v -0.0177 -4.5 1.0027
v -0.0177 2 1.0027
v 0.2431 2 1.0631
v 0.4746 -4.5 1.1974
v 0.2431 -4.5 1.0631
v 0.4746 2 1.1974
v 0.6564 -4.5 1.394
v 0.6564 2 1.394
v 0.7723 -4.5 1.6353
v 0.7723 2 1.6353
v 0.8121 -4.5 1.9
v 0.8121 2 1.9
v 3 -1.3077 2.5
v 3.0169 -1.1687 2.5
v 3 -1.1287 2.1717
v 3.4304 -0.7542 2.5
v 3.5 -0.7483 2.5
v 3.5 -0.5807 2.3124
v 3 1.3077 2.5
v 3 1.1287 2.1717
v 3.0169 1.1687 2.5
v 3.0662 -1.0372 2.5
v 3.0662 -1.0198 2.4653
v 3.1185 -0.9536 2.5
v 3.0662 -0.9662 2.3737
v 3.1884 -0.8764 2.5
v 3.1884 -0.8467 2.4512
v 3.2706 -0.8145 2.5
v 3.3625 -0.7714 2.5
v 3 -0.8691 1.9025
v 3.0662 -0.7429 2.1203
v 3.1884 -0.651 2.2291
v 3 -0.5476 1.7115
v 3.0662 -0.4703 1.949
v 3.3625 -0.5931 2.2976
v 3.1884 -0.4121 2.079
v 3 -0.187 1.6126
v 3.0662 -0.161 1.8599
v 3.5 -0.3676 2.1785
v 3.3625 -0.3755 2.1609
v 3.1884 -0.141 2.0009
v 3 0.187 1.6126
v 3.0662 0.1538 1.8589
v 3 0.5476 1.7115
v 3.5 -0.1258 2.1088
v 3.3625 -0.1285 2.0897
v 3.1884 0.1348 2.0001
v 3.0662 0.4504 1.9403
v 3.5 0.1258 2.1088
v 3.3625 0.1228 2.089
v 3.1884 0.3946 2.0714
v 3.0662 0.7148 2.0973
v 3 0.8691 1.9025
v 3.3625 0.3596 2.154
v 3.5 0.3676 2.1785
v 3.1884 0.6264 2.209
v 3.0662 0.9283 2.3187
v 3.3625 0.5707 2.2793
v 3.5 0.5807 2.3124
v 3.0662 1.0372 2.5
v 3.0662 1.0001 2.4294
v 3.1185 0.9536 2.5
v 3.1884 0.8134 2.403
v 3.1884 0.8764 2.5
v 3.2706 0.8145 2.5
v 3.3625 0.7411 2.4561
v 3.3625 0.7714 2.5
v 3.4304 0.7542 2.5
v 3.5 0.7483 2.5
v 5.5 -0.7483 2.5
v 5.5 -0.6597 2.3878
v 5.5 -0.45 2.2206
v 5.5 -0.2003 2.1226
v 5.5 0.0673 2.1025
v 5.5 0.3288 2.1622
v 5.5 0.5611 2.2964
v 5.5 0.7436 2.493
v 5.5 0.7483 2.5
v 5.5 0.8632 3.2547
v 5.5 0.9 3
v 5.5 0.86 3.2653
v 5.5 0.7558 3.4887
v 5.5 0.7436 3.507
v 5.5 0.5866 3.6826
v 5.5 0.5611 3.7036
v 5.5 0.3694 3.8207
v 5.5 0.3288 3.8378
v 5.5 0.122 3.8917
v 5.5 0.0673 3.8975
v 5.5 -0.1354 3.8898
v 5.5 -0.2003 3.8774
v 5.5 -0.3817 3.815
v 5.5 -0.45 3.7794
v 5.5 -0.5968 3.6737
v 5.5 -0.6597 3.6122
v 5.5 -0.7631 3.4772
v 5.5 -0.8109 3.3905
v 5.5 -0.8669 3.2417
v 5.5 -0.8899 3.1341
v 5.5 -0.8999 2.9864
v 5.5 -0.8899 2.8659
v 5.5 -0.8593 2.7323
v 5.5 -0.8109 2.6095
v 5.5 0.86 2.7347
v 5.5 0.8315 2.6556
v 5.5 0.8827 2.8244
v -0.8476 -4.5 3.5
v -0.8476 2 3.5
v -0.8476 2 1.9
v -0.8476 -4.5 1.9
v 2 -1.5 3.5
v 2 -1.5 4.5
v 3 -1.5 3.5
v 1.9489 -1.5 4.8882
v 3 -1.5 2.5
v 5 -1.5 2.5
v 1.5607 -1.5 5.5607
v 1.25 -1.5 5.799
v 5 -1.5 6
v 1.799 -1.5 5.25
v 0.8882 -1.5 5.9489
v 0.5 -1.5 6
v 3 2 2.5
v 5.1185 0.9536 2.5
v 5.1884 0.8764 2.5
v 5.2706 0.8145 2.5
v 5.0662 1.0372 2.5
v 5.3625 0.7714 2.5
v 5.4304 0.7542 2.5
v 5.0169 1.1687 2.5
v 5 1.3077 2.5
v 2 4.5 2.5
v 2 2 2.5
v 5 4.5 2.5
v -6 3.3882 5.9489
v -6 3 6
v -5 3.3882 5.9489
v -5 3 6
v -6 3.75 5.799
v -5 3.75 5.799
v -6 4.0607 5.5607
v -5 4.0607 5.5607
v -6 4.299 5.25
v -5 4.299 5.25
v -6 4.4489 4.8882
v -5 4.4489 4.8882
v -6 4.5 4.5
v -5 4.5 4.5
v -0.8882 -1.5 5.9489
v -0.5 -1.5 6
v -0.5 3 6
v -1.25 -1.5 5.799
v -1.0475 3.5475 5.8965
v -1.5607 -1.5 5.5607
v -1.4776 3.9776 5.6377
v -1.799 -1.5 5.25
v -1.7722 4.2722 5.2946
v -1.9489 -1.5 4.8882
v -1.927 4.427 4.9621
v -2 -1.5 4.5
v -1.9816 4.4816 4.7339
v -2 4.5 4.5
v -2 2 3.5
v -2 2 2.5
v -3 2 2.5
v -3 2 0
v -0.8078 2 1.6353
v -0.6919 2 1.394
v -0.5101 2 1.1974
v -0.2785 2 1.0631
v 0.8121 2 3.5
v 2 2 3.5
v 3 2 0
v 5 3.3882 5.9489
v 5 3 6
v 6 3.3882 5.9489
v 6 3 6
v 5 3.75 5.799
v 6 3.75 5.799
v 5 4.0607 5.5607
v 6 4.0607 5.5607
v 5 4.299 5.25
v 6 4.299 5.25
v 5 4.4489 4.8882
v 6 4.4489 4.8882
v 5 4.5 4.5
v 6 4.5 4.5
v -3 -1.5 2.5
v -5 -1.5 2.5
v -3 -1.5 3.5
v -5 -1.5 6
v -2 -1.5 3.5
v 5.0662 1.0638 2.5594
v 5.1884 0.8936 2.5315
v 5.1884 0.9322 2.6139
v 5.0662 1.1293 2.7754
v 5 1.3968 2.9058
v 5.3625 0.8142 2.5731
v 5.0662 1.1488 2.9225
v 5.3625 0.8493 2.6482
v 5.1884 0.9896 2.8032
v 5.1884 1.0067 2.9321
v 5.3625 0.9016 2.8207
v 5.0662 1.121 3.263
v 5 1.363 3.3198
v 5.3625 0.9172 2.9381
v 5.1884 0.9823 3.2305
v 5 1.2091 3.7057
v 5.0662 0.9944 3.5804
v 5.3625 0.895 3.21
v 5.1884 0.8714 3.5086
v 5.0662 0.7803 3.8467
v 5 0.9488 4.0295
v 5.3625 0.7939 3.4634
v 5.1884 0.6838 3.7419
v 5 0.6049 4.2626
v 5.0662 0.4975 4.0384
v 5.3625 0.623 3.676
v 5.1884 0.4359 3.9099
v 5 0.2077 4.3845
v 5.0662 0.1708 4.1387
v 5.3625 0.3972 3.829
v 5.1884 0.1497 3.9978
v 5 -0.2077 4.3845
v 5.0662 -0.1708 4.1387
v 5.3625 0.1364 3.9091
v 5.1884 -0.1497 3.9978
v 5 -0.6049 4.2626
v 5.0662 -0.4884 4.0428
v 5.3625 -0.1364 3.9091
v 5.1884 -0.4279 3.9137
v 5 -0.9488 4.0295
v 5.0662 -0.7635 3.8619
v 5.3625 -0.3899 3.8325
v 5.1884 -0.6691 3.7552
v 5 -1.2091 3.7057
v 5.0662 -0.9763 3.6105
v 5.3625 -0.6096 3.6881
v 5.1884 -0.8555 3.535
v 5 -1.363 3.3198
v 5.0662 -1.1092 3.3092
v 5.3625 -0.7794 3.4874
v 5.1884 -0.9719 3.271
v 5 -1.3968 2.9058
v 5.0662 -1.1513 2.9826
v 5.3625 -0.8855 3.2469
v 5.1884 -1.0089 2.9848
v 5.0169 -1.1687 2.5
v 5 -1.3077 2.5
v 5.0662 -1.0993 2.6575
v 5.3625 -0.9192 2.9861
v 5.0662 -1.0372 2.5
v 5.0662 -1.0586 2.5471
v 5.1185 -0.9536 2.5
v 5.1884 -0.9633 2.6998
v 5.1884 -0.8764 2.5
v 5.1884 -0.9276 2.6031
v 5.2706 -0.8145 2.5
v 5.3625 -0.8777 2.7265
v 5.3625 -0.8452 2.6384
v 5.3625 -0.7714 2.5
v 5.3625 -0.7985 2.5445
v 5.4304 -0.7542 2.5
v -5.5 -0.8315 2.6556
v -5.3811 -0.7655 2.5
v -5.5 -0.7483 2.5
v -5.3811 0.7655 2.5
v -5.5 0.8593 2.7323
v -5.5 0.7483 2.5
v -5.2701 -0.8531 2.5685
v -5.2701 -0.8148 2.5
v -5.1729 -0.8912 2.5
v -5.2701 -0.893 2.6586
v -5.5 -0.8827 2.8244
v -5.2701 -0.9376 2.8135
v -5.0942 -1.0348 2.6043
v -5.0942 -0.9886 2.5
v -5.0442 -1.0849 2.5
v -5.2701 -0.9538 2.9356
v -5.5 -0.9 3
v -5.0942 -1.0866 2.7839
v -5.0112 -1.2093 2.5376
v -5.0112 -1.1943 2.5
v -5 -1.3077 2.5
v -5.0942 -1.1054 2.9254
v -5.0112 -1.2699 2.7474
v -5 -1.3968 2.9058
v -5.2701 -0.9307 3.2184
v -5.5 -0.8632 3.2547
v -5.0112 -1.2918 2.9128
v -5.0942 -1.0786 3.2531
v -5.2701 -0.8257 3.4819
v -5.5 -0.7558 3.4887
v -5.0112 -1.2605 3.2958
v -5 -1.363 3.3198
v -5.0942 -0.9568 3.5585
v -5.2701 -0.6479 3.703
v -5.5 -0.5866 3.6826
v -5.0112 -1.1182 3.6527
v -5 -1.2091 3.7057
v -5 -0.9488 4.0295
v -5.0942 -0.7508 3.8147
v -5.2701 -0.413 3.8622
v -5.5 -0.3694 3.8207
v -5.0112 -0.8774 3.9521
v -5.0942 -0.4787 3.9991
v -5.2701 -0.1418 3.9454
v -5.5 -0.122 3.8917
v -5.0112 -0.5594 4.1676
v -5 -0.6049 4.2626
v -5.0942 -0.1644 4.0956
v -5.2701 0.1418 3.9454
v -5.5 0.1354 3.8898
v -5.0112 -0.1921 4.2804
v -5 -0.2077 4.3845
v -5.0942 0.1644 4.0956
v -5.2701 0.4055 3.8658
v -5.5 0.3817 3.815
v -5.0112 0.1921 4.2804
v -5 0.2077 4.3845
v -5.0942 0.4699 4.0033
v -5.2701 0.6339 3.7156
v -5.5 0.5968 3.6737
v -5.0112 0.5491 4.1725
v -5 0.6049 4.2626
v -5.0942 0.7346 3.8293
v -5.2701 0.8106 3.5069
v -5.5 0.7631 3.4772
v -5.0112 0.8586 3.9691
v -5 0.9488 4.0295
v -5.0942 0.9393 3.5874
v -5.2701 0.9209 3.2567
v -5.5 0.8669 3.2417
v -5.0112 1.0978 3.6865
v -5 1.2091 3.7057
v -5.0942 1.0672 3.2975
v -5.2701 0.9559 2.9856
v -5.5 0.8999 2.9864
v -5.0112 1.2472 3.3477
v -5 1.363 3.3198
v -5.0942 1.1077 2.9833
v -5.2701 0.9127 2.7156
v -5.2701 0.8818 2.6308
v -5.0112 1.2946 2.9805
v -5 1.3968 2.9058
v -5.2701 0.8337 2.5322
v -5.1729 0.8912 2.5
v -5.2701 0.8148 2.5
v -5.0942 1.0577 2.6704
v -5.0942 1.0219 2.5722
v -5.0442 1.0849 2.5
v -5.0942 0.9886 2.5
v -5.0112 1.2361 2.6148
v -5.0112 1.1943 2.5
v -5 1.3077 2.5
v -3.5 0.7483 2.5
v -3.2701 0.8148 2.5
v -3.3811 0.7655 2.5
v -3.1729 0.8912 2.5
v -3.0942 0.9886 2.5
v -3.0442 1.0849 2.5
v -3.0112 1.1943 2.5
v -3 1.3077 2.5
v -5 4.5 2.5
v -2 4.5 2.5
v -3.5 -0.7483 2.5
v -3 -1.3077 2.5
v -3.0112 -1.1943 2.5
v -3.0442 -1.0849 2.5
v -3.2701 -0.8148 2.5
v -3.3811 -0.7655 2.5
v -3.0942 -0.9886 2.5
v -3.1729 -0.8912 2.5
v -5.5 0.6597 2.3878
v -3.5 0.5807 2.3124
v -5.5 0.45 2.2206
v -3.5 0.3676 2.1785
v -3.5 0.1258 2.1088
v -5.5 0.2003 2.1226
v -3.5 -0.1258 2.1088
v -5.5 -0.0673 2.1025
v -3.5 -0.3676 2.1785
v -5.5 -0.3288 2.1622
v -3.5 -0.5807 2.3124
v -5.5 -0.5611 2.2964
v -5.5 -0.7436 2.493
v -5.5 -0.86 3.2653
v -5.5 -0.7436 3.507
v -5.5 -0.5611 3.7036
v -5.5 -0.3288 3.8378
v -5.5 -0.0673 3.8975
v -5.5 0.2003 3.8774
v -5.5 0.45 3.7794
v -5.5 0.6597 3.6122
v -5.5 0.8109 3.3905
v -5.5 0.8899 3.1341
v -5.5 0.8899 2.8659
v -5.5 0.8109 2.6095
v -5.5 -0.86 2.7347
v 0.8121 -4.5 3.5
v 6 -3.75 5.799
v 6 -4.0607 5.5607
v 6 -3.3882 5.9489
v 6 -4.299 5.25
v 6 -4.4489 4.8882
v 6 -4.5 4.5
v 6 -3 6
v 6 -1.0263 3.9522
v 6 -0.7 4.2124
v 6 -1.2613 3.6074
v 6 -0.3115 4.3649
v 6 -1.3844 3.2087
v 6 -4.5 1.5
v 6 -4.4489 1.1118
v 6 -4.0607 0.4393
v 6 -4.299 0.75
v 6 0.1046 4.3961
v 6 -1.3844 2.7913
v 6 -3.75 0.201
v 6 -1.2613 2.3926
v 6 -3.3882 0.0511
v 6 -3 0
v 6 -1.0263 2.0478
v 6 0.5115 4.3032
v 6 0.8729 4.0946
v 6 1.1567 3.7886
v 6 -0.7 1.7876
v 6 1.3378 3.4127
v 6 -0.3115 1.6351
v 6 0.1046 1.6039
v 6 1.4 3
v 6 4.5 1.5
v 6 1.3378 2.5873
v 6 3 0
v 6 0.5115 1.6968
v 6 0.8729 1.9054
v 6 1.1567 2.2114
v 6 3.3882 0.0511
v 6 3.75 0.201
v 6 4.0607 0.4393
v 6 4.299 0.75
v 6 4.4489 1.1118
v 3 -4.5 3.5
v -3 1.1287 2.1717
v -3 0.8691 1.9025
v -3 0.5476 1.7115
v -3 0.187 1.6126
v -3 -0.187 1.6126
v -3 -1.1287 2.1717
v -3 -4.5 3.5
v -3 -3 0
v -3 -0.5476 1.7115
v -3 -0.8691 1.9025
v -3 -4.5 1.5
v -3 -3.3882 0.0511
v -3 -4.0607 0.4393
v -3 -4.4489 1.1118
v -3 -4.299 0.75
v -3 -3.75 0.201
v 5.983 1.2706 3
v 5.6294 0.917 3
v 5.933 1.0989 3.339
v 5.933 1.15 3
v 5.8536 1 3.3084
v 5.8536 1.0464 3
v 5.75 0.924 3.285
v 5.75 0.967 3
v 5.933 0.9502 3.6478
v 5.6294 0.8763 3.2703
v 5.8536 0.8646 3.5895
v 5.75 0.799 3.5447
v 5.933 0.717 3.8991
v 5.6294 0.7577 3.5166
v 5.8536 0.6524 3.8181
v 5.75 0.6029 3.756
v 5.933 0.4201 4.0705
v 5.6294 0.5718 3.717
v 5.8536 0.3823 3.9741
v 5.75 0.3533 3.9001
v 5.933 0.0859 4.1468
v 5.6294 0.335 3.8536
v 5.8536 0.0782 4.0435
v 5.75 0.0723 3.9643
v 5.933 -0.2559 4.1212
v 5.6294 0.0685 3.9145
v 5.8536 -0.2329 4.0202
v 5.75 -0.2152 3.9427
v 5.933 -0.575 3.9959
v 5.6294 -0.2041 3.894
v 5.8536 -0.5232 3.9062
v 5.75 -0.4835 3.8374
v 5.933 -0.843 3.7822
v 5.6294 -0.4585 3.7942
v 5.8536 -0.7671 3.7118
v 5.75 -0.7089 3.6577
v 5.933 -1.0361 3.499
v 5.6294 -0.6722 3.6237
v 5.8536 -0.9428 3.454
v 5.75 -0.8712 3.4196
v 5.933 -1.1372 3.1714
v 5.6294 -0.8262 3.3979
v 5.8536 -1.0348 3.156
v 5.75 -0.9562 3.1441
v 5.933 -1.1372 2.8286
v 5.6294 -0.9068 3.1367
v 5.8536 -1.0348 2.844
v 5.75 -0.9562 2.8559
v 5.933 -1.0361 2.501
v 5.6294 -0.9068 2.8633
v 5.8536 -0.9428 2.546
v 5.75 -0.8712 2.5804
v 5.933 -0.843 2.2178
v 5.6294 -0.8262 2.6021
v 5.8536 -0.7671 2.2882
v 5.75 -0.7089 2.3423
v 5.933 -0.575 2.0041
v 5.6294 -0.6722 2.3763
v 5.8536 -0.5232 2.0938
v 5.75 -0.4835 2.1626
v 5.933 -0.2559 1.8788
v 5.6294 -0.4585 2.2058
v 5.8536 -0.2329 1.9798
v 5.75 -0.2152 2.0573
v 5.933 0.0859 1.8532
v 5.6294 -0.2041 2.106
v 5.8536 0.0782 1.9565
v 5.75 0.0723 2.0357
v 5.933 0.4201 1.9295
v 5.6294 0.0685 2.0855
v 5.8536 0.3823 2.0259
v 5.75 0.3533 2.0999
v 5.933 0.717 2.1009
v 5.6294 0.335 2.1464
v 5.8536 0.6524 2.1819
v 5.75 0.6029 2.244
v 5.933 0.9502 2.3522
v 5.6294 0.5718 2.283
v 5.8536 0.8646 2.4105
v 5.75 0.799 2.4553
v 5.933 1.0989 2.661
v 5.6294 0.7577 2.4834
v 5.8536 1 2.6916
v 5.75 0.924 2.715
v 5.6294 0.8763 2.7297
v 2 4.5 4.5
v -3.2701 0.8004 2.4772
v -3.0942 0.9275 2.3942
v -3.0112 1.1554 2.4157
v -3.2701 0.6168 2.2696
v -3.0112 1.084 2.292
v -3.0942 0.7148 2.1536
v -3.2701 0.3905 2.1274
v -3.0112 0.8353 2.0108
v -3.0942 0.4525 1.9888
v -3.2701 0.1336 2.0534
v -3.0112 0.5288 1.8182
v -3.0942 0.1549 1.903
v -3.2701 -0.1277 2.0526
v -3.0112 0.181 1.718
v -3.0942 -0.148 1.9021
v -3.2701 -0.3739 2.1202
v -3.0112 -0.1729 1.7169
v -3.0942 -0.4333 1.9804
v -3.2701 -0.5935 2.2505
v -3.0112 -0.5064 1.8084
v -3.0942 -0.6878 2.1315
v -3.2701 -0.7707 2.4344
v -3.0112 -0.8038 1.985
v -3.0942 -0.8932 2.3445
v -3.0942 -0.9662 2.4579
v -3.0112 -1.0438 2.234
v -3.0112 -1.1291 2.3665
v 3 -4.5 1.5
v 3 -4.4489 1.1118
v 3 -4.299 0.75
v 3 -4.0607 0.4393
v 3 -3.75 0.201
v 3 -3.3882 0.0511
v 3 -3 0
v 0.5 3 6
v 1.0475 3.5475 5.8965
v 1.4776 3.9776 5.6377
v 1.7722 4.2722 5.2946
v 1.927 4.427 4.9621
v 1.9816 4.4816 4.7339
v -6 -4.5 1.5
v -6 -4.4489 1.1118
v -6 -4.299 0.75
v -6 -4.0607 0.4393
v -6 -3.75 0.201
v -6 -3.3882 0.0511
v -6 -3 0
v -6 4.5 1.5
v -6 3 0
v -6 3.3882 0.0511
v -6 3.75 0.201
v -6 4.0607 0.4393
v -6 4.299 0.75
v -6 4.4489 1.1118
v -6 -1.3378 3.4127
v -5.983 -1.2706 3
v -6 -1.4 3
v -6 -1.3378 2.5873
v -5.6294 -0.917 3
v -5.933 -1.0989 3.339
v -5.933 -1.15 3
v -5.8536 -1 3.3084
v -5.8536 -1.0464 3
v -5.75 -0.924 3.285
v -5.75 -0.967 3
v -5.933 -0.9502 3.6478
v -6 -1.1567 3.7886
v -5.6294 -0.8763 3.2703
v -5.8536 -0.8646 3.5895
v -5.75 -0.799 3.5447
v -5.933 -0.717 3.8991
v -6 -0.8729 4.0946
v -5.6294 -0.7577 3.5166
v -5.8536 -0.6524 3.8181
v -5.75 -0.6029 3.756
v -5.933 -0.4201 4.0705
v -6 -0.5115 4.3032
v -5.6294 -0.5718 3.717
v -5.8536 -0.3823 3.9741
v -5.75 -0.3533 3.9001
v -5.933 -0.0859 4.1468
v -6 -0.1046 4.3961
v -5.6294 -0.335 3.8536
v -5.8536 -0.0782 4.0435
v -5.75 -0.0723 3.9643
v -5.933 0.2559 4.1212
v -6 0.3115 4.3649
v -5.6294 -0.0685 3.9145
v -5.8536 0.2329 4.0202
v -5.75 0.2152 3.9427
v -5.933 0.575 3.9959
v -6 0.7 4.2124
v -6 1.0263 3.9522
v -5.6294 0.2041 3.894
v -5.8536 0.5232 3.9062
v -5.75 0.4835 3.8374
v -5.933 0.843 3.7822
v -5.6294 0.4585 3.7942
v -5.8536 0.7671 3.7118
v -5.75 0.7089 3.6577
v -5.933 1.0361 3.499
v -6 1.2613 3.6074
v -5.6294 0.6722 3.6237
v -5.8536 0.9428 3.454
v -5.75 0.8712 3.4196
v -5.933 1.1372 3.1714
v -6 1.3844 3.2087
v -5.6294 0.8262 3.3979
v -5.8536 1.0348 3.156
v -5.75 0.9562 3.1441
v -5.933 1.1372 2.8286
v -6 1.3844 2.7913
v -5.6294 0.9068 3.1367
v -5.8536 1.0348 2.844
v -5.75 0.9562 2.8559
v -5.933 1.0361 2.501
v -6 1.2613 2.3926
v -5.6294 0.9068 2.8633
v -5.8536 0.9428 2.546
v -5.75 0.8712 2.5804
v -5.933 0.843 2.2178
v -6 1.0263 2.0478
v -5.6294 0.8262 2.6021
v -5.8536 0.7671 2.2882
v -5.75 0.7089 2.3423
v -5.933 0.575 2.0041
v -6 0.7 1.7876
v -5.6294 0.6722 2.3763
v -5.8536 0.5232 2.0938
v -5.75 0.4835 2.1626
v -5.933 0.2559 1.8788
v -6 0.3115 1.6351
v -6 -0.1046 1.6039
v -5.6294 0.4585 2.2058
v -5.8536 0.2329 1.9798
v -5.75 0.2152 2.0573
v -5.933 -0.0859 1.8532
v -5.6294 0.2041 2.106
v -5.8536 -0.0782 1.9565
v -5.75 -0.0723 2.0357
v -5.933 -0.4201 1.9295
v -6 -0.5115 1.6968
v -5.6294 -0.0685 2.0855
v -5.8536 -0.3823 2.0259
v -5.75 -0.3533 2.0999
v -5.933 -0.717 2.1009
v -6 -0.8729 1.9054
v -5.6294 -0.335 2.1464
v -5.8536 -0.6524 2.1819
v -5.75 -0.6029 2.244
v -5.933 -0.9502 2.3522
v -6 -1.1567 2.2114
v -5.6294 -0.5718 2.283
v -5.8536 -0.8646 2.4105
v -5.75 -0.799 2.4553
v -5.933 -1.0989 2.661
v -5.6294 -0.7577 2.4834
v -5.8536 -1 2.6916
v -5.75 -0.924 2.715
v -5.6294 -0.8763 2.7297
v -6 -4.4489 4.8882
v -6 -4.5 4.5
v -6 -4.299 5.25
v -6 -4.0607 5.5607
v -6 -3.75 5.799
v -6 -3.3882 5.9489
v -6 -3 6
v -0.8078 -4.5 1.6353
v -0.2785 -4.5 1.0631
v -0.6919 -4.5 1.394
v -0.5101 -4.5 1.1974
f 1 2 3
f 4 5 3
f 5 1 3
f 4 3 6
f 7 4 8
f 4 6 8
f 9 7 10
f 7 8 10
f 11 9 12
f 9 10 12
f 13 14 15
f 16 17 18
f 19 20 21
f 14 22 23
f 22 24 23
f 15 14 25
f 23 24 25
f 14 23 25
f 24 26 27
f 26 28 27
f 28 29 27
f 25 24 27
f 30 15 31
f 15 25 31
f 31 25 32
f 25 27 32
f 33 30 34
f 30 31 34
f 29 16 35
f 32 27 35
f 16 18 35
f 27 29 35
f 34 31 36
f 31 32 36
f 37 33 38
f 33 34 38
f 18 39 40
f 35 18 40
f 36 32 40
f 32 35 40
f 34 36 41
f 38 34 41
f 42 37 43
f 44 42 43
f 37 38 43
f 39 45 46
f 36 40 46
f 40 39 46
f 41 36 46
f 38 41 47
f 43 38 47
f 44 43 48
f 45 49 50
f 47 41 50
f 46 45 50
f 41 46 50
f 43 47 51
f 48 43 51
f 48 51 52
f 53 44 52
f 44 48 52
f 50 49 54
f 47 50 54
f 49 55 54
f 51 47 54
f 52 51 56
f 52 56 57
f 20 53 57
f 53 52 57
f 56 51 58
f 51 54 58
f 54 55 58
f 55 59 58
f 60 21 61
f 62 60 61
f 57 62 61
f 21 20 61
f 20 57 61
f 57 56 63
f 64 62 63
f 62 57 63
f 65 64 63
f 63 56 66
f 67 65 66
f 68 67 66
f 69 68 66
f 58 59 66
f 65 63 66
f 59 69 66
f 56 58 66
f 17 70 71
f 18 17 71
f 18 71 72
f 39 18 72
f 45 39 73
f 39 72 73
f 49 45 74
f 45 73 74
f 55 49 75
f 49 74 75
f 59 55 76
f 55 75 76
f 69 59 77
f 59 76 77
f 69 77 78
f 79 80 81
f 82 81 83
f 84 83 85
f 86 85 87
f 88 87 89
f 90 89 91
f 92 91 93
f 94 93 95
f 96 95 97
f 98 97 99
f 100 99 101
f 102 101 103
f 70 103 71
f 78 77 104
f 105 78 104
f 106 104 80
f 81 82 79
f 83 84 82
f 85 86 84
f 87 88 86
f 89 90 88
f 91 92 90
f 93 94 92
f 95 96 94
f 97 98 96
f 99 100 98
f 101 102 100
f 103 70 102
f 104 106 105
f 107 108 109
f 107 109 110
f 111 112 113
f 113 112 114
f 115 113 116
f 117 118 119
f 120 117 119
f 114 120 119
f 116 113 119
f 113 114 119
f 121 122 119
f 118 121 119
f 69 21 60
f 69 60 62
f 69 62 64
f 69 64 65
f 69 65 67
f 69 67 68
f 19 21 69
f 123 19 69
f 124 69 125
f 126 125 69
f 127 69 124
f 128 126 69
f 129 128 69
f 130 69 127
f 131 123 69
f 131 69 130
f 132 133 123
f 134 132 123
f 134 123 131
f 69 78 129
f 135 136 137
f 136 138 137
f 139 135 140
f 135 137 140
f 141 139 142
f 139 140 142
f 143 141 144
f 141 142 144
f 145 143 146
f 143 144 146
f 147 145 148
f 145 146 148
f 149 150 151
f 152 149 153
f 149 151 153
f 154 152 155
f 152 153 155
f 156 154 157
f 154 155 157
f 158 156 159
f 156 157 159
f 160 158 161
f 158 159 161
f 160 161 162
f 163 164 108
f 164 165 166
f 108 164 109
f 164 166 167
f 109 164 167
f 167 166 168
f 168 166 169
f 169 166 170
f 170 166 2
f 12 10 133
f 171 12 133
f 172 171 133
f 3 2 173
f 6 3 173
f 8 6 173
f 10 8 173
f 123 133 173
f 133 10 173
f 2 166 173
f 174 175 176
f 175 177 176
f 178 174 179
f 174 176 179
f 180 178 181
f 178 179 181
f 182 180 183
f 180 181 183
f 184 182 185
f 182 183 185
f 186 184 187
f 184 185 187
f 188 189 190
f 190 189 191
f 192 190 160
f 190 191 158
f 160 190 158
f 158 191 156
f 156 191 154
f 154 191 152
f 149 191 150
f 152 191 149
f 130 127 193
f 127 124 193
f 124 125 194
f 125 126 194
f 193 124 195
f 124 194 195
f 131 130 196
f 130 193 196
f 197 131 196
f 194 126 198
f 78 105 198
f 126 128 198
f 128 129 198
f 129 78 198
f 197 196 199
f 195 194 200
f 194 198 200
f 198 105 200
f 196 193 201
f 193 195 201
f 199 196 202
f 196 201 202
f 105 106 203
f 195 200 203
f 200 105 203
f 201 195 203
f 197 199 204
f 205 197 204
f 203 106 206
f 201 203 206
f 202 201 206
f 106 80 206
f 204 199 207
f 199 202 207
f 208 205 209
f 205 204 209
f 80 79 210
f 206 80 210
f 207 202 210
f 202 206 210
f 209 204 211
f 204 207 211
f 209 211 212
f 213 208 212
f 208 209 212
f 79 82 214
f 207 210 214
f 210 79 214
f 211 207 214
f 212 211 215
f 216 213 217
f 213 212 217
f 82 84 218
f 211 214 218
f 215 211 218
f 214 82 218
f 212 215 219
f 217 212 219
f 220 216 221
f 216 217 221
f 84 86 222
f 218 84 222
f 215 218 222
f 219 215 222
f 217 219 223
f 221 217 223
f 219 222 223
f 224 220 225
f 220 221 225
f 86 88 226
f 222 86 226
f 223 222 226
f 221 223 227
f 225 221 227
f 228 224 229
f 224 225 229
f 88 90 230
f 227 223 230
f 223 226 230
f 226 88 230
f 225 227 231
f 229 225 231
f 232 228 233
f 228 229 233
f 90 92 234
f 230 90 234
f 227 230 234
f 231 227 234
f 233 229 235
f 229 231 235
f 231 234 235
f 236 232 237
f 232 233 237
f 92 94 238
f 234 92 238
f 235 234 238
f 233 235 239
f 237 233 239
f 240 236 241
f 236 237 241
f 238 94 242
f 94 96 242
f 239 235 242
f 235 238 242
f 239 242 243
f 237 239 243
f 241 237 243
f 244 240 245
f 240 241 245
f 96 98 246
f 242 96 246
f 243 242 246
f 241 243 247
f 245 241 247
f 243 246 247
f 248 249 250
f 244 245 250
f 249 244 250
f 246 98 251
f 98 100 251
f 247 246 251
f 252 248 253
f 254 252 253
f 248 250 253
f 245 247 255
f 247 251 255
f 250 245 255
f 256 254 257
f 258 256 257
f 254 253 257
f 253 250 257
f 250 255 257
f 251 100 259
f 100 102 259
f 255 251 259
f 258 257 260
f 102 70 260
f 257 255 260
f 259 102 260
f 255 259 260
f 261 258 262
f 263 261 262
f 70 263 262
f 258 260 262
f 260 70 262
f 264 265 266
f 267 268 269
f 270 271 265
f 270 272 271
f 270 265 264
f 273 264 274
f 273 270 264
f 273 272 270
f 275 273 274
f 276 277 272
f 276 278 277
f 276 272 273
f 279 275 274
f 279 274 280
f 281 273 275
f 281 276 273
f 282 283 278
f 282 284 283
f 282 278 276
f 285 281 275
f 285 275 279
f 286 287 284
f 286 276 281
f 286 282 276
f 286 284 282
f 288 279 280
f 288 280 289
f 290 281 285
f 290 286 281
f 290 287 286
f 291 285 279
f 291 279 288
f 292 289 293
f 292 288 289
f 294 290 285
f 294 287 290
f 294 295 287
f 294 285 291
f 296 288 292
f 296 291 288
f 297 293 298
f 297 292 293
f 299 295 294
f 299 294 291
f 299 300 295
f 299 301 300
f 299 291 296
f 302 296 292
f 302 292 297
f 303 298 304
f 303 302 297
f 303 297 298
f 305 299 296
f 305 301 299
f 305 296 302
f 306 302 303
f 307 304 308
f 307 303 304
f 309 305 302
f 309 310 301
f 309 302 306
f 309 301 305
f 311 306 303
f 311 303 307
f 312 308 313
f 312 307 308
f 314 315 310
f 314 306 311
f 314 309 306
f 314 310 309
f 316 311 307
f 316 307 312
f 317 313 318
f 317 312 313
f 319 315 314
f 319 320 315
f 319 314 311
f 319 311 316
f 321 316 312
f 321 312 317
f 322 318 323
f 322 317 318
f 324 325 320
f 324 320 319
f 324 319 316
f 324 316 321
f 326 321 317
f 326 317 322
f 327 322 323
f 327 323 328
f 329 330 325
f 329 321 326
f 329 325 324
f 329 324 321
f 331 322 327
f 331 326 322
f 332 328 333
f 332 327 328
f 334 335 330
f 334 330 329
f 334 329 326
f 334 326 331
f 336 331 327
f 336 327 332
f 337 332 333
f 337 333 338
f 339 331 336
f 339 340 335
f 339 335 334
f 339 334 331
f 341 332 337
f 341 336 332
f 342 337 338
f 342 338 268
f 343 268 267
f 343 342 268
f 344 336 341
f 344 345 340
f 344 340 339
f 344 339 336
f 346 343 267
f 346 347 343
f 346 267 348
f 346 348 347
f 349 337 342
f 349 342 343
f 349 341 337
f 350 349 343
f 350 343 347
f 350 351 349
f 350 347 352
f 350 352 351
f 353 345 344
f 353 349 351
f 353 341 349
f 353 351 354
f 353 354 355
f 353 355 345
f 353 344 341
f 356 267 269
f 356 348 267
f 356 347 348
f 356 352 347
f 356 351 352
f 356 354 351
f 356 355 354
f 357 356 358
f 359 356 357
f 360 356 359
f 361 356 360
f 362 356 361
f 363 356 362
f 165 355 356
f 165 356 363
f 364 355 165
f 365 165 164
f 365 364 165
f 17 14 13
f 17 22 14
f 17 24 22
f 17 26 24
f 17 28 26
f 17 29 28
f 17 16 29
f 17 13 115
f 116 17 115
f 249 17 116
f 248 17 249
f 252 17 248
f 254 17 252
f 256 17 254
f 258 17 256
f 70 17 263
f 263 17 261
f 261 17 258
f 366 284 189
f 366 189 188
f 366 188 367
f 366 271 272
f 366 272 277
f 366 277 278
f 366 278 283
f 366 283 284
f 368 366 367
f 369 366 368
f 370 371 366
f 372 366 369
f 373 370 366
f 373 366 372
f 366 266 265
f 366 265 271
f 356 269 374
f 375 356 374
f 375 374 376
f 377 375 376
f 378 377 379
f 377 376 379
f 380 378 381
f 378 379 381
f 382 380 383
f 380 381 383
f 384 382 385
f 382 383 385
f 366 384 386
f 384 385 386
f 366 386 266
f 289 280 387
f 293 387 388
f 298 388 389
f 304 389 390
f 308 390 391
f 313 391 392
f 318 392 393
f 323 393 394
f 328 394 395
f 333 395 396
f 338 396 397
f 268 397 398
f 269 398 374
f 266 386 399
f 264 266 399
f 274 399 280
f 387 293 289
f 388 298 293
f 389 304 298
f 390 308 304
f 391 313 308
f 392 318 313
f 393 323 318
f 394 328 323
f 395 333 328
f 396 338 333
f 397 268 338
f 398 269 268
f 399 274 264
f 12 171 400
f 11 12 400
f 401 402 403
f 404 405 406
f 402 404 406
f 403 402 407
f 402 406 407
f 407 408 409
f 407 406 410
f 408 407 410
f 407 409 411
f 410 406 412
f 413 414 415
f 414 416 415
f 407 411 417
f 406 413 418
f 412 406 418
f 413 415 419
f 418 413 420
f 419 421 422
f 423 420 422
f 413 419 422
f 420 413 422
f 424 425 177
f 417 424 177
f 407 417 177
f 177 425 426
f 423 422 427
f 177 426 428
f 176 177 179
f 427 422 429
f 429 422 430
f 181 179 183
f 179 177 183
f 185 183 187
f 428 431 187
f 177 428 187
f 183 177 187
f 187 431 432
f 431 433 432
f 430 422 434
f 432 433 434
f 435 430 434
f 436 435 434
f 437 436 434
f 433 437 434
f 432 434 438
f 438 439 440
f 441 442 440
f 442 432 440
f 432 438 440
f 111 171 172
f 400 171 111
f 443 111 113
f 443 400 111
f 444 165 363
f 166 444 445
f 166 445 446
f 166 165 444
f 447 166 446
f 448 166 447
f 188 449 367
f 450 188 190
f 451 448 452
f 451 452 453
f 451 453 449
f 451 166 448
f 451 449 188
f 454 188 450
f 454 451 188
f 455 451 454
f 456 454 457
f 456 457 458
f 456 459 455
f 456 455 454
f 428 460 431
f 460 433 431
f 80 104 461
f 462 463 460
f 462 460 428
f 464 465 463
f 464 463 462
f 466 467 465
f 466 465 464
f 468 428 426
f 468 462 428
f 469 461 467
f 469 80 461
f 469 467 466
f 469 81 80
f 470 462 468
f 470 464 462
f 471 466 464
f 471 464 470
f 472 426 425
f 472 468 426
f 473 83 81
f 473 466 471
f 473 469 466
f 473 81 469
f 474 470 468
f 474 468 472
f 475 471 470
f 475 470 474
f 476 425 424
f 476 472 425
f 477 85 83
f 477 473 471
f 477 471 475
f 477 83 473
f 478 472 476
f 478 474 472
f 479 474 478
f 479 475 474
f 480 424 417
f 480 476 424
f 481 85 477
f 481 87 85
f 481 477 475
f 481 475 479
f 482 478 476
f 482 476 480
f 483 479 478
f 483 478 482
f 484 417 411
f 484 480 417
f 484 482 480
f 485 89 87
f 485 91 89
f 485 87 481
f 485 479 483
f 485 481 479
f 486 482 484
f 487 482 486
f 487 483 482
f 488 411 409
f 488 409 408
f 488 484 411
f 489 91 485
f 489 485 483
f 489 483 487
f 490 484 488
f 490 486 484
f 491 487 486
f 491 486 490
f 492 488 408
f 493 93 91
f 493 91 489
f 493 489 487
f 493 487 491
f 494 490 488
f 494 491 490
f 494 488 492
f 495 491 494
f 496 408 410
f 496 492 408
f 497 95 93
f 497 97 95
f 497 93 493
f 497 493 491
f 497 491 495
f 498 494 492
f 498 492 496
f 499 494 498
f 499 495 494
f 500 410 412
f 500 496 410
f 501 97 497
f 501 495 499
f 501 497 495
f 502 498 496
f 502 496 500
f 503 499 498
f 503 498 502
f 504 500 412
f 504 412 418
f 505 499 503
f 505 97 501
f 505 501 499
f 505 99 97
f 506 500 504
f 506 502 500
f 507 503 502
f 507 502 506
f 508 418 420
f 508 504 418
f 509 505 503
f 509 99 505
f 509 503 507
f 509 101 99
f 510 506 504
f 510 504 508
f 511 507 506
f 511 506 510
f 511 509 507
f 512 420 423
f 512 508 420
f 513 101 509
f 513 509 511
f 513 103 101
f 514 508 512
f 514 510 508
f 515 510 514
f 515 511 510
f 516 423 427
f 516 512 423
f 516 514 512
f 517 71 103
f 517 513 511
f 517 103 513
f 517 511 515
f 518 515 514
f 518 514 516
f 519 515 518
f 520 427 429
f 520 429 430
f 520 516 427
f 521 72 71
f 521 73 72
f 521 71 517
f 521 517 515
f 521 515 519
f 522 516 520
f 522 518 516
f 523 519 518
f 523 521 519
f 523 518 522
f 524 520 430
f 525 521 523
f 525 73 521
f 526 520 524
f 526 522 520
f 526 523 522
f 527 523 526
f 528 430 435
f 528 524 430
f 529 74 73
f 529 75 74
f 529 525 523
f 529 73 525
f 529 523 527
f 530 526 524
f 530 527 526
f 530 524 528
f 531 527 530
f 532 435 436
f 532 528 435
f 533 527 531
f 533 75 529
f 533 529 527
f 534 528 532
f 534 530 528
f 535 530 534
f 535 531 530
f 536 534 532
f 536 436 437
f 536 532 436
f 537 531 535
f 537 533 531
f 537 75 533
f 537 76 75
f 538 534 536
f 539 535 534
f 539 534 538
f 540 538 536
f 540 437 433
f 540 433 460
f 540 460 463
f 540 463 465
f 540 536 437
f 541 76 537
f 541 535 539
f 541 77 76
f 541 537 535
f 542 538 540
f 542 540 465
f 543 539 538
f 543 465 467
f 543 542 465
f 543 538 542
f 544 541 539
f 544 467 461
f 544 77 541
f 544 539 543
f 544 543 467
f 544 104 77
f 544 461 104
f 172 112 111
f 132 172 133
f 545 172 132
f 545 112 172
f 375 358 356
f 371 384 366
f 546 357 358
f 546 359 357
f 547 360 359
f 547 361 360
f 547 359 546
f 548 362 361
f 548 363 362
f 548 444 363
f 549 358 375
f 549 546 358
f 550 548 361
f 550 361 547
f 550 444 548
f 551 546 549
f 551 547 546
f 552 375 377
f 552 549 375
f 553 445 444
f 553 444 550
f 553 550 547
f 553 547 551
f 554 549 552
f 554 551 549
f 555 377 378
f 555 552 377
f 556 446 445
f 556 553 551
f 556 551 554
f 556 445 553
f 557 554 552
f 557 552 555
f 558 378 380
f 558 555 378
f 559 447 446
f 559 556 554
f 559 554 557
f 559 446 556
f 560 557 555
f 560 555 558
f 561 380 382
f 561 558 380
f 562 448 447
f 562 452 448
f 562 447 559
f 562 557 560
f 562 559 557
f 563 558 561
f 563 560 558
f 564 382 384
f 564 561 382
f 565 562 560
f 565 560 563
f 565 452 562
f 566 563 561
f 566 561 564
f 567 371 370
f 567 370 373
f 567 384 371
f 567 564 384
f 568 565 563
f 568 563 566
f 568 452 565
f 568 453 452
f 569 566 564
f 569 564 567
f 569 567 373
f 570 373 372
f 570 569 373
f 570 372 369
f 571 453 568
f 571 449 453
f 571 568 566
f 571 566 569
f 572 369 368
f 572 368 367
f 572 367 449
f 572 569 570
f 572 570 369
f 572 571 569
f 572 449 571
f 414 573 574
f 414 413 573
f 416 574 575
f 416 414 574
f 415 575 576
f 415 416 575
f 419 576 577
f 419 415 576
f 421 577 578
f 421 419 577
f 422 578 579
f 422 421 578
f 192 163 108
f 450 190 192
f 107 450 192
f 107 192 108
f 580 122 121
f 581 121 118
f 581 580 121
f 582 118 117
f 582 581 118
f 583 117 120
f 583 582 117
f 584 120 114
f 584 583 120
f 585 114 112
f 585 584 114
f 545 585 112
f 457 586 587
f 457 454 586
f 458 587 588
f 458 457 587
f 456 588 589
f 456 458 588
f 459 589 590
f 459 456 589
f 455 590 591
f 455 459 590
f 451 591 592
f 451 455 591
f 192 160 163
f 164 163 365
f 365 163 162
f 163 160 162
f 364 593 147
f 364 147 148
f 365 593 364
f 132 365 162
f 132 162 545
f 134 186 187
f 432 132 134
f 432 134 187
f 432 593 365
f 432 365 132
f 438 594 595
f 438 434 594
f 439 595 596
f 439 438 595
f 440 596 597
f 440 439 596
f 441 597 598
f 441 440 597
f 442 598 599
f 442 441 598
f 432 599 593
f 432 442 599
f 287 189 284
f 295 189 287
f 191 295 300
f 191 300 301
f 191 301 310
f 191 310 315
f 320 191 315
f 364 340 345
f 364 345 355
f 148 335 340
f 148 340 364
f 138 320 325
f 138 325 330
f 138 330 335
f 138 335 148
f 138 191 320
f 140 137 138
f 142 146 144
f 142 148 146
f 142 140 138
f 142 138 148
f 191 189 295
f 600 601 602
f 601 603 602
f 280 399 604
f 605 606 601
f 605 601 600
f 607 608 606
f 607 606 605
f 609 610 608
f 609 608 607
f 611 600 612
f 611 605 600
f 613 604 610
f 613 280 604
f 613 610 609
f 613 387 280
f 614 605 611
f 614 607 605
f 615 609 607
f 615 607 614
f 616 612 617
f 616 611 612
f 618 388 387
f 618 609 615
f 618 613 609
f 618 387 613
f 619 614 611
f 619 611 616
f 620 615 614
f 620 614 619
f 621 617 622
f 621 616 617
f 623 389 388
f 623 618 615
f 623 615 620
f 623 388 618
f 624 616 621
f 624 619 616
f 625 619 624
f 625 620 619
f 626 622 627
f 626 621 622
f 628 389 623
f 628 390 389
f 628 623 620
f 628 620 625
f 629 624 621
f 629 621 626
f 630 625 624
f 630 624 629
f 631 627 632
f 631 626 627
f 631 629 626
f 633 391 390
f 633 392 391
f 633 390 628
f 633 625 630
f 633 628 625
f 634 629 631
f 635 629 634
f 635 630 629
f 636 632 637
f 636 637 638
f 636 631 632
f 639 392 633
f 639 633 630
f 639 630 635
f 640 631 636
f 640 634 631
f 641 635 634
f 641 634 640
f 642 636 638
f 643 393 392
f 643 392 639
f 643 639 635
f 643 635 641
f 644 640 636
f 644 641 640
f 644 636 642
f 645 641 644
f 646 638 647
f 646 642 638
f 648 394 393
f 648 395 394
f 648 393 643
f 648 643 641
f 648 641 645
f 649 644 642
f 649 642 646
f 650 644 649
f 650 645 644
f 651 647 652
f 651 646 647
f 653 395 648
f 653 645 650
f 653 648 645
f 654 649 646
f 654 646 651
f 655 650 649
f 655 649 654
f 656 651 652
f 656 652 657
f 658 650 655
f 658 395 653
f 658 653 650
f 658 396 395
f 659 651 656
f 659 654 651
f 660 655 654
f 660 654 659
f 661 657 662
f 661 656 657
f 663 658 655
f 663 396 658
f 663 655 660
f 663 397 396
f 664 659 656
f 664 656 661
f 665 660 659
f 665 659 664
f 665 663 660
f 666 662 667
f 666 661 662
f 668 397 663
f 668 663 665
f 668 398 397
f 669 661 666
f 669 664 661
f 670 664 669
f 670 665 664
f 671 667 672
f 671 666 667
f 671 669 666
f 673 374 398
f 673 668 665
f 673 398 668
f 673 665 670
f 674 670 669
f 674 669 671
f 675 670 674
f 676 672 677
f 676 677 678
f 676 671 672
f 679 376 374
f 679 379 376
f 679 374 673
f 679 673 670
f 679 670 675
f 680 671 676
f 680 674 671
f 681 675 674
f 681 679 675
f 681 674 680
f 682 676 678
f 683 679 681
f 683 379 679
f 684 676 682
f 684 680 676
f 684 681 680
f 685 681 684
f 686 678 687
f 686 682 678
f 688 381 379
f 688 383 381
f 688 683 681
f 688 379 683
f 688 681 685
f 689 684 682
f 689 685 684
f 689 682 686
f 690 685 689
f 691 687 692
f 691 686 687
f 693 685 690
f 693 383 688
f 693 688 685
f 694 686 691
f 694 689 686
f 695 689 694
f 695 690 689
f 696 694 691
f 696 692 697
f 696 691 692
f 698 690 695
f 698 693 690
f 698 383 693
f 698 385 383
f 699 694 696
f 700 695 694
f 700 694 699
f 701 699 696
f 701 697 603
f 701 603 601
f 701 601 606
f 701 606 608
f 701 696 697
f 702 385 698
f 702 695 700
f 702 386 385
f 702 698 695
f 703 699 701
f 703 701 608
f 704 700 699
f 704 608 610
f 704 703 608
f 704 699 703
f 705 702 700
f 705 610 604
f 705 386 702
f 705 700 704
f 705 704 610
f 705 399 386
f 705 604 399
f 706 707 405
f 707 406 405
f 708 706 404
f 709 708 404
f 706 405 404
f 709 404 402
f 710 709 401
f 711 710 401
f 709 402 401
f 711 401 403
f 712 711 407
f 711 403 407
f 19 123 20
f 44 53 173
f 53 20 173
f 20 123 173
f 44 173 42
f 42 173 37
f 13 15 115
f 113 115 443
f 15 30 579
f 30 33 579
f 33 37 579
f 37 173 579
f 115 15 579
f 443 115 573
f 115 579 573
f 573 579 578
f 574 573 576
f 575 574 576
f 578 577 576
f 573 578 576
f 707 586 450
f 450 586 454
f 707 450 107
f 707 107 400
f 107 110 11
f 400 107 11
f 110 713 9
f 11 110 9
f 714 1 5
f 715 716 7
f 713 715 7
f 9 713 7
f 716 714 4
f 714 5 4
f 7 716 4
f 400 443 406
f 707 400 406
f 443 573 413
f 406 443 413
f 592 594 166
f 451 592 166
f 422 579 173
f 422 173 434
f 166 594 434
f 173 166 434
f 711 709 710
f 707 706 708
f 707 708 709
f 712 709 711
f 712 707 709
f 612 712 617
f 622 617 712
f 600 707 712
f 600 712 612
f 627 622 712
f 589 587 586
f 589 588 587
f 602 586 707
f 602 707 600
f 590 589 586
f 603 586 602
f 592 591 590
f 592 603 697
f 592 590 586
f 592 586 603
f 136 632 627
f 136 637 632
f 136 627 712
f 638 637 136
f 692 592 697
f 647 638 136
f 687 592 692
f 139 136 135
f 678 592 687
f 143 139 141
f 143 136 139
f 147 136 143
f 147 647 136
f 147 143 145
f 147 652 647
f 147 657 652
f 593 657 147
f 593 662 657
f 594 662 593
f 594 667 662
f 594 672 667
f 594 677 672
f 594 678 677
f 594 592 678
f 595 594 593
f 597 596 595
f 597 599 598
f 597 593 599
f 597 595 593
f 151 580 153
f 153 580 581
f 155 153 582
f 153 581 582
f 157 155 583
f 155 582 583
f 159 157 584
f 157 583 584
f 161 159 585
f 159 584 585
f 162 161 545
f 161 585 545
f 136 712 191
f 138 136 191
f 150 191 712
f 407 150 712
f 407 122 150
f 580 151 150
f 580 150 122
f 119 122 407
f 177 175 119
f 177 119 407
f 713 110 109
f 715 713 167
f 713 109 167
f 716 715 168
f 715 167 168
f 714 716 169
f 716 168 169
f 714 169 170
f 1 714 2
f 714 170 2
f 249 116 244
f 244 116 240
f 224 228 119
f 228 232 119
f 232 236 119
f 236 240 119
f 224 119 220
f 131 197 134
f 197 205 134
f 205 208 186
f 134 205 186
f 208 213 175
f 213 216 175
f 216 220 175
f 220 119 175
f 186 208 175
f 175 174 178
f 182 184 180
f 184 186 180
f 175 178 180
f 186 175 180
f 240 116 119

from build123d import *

# Parameters (mm, degrees)
F0_W         = 12
F0_H         = 9
F1_DEPTH     = 6
F2_W         = 3
F2_H         = 6
F3_DEPTH     = 3.5
F4_W         = 6
F4_H         = 6.5
F5_DEPTH     = 3.5
F6_R         = 0.9
F7_DEPTH     = 3
F8_R         = 0.9
F9_DEPTH     = 3.001
F10_R        = 1.5
F11_W        = 1.6597382491
F11_H        = 6.5
F12_DEPTH    = 2.5
F13_T1_DEPTH = 8.75
F14_R        = 0.49999


# Not quite as in the source:
# - a fillet or chamfer that OpenCascade refuses, or shapes differently, is made with other operations: its cross-section is extruded or revolved along the edge and cut away or added
# - a fillet or chamfer is up to 0.001 mm smaller than in the source, because OpenCascade refuses the exact size


with BuildPart() as f1:
    # F0 (on Top) → F1 (new body)
    with BuildSketch(Plane.XY):
        Rectangle(F0_W, F0_H)
    extrude(amount=F1_DEPTH)

    # F2 (on face) → F3 (cut)
    with BuildSketch(Plane.XY.offset(6)):
        with Locations((3.5, 1.5)):
            Rectangle(F2_W, F2_H)
        with Locations((-3.5, 1.5)):
            Rectangle(F2_W, F2_H)
    extrude(amount=-F3_DEPTH, mode=Mode.SUBTRACT)

    # F4 (on face) → F5 (cut)
    with BuildSketch(Plane(origin=(0, 0, 0), x_dir=(1, 0, 0), z_dir=(0, 0, -1))):
        with Locations((0, 1.25)):
            Rectangle(F4_W, F4_H)
    extrude(amount=-F5_DEPTH, mode=Mode.SUBTRACT)

    # F6 (on face) → F7 (cut)
    with BuildSketch(Plane.YZ.offset(6)):
        with Locations((0, 3)):
            Circle(F6_R)
    extrude(amount=-F7_DEPTH, mode=Mode.SUBTRACT)

    # F8 (on face) → F9 (cut, through all)
    with BuildSketch(Plane(origin=(-6, 0, 0), x_dir=(0, -1, 0), z_dir=(-1, 0, 0))):
        with Locations((0, 3)):
            Circle(F8_R)
    extrude(amount=-F9_DEPTH, mode=Mode.SUBTRACT)

    # F10
    f10_edges = [f1.edges().sort_by_distance(p)[0] for p in [
        (2, 1.5, 6),
        (-2, 1.5, 6),
        (0, -4.5, 6),
        (-4.5, -4.5, 0),
        (4.5, -4.5, 0),
        (0, 4.5, 0),
        (-5.5, 4.5, 6),
        (5.5, 4.5, 6),
        (0, 4.5, 6),
    ]]
    fillet(f10_edges, radius=F10_R)

    # F11 (on face) → F12 (join)
    with BuildSketch(Plane(origin=(0, 0, 3.5), x_dir=(1, 0, 0), z_dir=(0, 0, -1))):
        with Locations((-0.017724873, 1.25)):
            Rectangle(F11_W, F11_H)
    extrude(amount=F12_DEPTH)

    # F13: fillet of radius 0.9 on 2 edges, made by hand

    # F13_s2 → F13_t1 (cut)
    with BuildSketch(Plane.XZ.offset(-2)):
        with BuildLine():
            ThreePointArc((-0.0878557485, 1), (0.5485403546, 1.2636038969), (0.8121442515, 1.9))
            Line((0.8121442515, 1.9), (0.8121442515, 1))
            Line((0.8121442515, 1), (-0.0878557485, 1))
        make_face()
        with BuildLine():
            ThreePointArc((-0.8475939976, 1.9), (-0.5839901007, 1.2636038969), (0.0524060024, 1))
            Line((0.0524060024, 1), (-0.8475939976, 1))
            Line((-0.8475939976, 1), (-0.8475939976, 1.9))
        make_face()
    extrude(amount=F13_T1_DEPTH, mode=Mode.SUBTRACT)

    # F14 (radius 0.5 in the source; OpenCascade refuses exactly that, so slightly less here)
    f14_edges = [f1.edges().sort_by_distance(p)[0] for p in [
        (6, -0.9, 3),
        (-6, 0.9, 3),
        (-3, 0, 2.1),
        (5, 0.861249, 2.738751),
        (5, -0.261249, 3.861249),
        (3, 0, 2.1),
        (-5, -0.861249, 2.738751),
        (-5, 0.261249, 3.861249),
    ]]
    fillet(f14_edges, radius=F14_R)


solid = f1.part
